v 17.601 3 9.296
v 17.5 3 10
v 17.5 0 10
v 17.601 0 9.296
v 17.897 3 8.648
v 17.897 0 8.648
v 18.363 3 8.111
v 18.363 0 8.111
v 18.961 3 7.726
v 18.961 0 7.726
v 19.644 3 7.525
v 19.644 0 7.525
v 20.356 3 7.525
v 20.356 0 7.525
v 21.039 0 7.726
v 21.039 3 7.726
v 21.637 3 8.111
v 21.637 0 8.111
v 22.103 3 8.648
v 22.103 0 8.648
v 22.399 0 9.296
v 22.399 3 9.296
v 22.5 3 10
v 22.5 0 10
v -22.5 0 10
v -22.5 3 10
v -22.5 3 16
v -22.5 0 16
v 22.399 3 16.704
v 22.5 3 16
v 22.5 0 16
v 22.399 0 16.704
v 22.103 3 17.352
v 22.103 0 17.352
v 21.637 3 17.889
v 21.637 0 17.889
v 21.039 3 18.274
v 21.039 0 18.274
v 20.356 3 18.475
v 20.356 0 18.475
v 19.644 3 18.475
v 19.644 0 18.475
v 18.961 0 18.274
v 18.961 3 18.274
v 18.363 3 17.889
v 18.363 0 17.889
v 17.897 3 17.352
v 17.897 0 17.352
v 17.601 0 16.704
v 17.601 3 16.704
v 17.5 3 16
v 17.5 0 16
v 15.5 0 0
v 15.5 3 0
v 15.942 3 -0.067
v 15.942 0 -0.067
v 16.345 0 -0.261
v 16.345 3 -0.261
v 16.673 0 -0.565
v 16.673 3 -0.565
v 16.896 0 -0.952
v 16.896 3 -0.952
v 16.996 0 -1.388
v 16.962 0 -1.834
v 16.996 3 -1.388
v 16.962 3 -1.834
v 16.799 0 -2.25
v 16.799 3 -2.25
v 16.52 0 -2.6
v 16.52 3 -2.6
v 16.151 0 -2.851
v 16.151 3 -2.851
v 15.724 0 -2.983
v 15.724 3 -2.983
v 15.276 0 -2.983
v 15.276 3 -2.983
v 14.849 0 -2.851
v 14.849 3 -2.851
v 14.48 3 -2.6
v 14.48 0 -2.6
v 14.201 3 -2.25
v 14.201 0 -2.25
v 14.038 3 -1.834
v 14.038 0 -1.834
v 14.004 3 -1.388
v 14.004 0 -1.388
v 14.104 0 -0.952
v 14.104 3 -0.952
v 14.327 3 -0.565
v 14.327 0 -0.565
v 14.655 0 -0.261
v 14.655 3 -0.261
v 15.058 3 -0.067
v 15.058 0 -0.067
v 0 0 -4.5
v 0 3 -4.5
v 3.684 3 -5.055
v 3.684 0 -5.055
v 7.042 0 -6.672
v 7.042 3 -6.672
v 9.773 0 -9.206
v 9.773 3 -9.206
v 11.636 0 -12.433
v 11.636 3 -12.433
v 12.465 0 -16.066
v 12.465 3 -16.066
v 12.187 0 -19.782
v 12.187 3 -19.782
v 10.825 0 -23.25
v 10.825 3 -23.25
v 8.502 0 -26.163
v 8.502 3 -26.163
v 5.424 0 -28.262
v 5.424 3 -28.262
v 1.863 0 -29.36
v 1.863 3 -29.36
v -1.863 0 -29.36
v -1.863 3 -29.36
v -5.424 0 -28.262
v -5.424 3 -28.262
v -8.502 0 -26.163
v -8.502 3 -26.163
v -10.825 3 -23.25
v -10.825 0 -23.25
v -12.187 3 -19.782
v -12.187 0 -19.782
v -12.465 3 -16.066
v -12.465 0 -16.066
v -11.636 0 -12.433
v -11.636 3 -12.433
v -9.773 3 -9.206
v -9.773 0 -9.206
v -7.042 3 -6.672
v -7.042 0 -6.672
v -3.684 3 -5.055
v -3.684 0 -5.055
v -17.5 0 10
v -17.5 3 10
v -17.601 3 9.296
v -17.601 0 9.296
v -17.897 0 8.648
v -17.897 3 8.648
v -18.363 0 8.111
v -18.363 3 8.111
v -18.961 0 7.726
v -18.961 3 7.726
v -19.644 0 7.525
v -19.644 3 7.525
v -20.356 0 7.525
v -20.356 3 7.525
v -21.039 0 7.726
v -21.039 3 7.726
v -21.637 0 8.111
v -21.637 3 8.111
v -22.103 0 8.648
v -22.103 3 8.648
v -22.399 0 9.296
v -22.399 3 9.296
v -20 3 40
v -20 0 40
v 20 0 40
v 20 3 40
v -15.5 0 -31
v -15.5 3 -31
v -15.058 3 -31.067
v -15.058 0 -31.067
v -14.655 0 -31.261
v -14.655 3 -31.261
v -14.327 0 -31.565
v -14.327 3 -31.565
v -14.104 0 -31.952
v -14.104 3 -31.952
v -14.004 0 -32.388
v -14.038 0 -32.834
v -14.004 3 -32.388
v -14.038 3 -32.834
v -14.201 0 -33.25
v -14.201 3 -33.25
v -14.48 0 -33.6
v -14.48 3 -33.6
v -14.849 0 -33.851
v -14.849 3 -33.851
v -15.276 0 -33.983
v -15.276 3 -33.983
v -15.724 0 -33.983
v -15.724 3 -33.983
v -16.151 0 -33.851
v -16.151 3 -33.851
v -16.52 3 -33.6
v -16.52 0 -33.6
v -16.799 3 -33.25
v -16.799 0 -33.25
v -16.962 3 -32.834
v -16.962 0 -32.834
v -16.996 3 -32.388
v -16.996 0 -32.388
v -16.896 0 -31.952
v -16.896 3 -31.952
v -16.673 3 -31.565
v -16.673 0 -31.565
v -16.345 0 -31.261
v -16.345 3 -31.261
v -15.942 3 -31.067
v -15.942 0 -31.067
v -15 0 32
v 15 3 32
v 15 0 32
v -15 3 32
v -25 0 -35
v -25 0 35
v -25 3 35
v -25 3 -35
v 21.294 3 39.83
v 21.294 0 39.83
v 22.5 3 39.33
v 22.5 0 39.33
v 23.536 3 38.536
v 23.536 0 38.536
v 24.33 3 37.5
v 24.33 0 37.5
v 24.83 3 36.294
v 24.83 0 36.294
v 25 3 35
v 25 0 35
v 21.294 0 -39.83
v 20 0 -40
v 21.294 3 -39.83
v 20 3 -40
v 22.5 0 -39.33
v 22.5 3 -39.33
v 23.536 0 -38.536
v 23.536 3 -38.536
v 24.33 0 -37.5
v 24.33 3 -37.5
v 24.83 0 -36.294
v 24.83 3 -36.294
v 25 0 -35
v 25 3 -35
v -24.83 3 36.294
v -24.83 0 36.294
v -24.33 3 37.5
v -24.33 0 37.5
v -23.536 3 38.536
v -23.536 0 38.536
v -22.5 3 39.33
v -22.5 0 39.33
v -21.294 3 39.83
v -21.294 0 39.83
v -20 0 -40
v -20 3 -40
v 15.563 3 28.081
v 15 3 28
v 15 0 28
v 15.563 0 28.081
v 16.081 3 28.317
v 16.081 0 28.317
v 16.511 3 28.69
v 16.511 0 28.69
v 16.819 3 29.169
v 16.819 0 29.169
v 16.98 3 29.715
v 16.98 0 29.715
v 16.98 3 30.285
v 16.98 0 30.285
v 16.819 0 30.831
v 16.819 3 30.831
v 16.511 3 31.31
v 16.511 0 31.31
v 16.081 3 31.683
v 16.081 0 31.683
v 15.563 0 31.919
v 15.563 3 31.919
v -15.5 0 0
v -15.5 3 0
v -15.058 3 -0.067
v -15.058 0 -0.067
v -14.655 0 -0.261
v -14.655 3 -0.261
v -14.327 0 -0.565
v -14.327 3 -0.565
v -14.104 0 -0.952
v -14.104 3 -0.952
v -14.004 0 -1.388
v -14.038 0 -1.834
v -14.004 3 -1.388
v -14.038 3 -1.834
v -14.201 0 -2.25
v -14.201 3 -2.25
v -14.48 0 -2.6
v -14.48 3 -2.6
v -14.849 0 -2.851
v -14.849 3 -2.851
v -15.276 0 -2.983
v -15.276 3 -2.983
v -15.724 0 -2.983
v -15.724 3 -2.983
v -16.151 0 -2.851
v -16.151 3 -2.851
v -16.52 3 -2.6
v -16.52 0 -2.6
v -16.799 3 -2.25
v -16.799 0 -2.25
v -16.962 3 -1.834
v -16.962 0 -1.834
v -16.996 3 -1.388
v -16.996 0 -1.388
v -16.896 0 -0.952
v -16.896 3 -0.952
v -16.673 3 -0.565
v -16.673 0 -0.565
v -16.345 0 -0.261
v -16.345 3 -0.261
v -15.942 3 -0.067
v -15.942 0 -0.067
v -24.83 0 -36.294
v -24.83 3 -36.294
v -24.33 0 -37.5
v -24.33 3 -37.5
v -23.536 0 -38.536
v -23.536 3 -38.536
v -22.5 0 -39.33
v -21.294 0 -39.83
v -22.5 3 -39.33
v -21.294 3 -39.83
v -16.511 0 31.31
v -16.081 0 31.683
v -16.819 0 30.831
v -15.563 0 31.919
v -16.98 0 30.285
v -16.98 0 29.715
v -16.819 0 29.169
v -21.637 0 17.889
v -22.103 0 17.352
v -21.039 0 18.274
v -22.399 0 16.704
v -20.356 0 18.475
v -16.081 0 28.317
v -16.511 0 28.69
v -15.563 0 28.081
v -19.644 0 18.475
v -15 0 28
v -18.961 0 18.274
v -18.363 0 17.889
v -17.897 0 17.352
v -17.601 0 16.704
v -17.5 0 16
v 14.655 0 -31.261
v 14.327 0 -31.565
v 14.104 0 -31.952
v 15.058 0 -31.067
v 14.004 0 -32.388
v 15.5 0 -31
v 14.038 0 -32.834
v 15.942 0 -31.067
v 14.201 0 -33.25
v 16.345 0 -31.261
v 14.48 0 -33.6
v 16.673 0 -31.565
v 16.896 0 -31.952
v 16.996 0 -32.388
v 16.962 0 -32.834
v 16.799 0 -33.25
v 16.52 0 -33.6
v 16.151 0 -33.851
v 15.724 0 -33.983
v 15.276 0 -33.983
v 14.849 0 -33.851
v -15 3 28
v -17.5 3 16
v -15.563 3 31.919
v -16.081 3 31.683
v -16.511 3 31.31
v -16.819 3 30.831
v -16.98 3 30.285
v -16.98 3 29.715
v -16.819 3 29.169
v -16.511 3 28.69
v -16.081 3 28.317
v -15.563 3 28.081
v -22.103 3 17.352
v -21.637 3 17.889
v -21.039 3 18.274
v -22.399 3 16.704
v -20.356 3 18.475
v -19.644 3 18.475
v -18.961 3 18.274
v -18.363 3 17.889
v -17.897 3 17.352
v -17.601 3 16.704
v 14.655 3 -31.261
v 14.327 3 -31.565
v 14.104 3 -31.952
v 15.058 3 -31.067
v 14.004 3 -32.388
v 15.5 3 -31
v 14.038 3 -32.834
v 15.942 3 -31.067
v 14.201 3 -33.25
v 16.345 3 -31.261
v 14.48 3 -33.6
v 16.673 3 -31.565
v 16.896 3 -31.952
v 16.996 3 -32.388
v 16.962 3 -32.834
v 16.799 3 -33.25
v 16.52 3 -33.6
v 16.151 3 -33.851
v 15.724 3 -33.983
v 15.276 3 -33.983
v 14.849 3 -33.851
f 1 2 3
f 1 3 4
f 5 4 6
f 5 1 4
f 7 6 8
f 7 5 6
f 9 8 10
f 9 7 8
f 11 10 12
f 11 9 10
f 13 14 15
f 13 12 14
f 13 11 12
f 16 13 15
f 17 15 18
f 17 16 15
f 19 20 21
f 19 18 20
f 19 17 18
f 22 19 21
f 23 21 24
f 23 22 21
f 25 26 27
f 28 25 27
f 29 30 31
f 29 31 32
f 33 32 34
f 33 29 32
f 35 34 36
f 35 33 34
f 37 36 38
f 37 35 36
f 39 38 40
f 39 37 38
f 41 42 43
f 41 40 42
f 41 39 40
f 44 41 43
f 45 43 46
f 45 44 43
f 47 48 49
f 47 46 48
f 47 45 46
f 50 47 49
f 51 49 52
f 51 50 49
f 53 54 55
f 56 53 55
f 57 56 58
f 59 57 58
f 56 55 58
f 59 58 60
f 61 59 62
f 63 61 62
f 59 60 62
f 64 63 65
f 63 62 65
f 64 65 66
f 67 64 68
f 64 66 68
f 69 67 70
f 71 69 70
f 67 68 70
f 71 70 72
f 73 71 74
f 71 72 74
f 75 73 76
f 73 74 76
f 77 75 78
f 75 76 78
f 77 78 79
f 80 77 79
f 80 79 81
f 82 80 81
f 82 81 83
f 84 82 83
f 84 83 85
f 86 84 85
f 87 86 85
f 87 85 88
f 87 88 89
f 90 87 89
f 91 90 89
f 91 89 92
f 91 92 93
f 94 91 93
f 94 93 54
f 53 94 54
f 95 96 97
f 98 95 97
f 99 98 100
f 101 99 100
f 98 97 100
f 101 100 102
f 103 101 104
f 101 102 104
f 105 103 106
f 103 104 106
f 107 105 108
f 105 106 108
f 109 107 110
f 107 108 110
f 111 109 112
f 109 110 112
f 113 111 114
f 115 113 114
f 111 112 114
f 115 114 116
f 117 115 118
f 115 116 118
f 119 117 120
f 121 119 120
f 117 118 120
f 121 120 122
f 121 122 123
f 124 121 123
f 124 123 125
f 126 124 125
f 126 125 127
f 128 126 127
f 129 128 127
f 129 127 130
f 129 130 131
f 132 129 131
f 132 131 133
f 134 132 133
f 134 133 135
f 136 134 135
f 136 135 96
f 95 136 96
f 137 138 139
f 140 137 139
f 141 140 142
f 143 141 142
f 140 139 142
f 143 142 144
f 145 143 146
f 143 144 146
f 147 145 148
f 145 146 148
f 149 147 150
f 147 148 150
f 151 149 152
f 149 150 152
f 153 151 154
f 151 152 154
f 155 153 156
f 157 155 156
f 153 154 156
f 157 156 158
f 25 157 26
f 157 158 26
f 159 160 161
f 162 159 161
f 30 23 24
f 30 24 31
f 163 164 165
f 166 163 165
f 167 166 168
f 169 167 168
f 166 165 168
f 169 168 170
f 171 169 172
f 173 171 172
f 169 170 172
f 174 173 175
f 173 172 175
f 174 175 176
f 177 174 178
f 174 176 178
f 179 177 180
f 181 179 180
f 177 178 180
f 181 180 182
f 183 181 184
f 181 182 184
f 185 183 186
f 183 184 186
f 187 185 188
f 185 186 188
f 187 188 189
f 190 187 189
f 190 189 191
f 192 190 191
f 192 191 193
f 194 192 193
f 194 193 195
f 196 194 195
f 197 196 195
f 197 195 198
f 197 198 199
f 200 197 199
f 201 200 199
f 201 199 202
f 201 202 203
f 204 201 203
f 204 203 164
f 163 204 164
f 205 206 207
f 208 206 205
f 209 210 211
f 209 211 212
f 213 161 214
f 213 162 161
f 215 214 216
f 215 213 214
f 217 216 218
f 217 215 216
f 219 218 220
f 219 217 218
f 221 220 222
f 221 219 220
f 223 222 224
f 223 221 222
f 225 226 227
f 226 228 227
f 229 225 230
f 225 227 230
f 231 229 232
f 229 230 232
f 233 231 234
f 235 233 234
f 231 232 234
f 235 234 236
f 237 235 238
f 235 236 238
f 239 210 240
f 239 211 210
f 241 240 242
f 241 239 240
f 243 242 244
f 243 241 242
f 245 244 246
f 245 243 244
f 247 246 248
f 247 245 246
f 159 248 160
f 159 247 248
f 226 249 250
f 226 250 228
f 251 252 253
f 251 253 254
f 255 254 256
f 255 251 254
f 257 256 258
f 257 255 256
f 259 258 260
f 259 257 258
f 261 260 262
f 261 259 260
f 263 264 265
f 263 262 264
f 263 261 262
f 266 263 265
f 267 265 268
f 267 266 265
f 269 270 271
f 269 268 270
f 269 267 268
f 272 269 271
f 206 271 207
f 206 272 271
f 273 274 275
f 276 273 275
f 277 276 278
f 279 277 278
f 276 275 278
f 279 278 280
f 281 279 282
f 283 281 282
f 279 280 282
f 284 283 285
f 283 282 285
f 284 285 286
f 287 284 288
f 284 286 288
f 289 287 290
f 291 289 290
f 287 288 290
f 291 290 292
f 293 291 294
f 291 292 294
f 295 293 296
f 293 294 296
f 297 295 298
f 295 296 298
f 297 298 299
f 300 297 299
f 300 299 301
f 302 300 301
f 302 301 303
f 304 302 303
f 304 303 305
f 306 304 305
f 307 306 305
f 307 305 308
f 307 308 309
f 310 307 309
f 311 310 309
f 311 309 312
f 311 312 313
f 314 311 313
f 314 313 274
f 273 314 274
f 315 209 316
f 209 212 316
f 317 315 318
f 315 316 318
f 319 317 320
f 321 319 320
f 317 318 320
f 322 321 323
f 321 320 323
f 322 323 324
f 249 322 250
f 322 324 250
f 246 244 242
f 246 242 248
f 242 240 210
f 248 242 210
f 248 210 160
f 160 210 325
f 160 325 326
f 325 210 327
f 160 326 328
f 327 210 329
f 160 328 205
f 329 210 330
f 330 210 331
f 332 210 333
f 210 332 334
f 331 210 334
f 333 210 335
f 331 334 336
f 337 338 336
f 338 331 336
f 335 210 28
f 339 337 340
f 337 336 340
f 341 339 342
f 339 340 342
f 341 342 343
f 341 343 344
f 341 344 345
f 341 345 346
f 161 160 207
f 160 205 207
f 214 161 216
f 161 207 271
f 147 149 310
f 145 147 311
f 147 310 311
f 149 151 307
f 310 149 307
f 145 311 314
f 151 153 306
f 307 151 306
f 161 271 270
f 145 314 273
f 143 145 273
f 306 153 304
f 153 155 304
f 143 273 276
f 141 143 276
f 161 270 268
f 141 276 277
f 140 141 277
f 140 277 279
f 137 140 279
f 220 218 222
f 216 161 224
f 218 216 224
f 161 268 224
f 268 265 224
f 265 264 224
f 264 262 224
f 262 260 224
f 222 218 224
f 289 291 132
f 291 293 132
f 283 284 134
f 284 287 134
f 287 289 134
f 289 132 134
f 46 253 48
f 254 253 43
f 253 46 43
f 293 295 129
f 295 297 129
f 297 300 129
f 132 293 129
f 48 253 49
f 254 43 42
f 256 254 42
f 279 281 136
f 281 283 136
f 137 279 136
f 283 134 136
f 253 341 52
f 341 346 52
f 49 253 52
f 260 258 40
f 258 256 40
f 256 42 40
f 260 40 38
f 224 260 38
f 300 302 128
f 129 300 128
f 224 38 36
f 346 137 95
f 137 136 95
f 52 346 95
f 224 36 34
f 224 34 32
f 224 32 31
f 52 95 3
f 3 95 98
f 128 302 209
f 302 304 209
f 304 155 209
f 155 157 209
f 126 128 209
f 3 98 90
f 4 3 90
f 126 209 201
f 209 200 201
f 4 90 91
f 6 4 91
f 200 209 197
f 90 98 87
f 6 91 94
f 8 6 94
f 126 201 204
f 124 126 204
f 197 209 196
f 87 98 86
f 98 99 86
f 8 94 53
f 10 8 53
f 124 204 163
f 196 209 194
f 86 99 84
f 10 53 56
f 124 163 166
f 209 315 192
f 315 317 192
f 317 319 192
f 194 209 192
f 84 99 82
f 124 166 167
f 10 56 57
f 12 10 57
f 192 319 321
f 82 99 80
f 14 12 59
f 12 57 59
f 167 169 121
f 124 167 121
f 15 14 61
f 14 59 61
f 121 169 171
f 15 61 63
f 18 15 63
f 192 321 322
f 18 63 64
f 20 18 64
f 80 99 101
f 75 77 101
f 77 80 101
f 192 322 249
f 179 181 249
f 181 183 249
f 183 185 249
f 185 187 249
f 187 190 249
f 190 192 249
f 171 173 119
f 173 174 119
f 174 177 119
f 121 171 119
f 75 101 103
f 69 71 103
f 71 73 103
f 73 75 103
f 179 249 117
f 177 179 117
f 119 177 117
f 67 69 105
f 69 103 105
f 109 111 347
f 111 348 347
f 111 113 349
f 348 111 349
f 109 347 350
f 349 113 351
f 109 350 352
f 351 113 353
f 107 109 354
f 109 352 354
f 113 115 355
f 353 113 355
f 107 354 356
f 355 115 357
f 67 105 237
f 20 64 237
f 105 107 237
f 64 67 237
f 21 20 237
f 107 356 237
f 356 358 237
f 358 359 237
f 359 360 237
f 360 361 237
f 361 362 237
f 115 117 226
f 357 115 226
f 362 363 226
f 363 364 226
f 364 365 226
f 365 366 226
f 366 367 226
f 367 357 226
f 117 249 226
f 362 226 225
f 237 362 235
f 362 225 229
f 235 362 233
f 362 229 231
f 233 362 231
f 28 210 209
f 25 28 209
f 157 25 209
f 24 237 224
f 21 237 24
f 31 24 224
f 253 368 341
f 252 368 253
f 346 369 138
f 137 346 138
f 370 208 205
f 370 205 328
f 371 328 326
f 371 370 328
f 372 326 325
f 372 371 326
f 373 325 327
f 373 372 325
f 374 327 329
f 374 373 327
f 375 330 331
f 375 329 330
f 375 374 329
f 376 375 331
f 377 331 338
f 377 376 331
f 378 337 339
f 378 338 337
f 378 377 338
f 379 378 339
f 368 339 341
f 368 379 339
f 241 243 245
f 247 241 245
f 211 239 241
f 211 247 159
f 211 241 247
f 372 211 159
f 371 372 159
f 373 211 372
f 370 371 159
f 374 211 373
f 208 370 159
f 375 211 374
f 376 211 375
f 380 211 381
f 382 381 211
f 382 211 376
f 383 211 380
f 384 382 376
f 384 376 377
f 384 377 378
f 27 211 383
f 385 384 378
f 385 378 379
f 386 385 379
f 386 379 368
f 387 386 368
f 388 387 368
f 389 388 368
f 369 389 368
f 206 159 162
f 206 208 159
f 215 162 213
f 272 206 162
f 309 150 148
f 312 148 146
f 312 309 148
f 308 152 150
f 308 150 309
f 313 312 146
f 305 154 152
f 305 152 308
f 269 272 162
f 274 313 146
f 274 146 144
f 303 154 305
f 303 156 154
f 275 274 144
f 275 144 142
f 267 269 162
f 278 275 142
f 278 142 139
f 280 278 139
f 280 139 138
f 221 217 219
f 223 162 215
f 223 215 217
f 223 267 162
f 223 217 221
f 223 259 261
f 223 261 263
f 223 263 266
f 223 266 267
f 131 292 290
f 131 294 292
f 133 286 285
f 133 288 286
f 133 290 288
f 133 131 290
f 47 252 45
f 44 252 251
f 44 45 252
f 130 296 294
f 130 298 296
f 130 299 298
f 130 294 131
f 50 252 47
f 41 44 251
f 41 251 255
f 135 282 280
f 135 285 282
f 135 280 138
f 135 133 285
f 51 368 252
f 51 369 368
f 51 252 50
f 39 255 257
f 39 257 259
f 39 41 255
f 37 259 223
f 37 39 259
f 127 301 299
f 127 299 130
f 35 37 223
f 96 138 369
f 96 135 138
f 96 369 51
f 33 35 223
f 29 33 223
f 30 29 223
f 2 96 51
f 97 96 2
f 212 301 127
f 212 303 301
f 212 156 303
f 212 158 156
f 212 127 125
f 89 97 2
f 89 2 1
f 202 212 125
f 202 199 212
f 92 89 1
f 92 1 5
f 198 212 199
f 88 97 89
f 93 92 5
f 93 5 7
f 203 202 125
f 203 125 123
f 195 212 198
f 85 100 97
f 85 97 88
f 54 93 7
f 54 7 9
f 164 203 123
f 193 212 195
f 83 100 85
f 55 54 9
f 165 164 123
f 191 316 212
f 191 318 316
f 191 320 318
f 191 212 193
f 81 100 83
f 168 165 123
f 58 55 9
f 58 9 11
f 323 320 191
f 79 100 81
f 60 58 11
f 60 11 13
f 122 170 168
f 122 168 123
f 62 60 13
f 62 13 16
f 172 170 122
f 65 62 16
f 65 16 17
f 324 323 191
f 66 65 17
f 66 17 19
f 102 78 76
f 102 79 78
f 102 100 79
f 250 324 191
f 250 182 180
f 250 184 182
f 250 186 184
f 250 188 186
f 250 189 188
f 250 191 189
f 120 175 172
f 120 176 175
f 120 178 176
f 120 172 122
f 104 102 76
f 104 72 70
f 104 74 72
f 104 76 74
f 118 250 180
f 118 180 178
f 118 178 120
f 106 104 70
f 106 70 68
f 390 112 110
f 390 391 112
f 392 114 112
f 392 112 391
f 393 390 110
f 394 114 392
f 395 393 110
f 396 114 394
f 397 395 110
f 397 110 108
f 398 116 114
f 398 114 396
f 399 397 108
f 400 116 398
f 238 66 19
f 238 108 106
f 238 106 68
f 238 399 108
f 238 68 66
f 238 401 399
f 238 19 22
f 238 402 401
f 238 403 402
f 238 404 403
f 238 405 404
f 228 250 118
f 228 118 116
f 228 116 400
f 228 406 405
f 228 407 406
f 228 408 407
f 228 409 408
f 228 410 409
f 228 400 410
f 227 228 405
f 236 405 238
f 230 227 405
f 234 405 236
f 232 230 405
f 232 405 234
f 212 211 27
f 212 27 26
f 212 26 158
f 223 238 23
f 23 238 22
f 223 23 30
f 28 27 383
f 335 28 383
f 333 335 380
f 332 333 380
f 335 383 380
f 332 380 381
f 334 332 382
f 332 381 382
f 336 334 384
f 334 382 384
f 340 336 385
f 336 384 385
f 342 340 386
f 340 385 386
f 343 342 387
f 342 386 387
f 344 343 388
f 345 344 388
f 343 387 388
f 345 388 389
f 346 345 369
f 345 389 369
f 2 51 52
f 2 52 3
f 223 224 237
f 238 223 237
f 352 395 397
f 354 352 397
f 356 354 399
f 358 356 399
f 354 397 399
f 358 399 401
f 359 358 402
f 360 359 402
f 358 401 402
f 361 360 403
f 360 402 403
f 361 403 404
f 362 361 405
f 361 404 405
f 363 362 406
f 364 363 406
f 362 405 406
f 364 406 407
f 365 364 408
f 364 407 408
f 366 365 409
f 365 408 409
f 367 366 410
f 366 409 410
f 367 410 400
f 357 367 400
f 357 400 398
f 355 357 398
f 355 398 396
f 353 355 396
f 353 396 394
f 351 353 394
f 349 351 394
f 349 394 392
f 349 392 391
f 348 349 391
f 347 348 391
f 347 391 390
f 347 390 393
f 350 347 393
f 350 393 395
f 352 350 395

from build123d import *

# Parameters (mm, degrees)
SKETCH1_W           = 50
SKETCH1_H           = 80
BOSS_EXTRUDE1_DEPTH = 3
SKETCH2_R           = 1.5
SKETCH2_R_2         = 12.5
CUT_EXTRUDE1_DEPTH  = 48.265209192
FILLET1_R           = 5
CUT_EXTRUDE2_DEPTH  = 48.265209192


with BuildPart() as part:
    # Sketch1 → Boss-Extrude1 (new body)
    with BuildSketch(Plane(origin=(0, 0, 0), x_dir=(1, 0, 0), z_dir=(0, 1, 0))):
        Rectangle(SKETCH1_W, SKETCH1_H)
    extrude(amount=BOSS_EXTRUDE1_DEPTH)

    # Sketch2 → Cut-Extrude1 (cut, through all)
    with BuildSketch(Plane(origin=(0, 3, 0), x_dir=(1, 0, 0), z_dir=(0, 1, 0))):
        with Locations(Location((15.5, 32.5, 0), (0, 0, 270))):
            Circle(SKETCH2_R)
        with Locations(Location((-15.5, 32.5, 0), (0, 0, 270))):
            Circle(SKETCH2_R)
        with Locations(Location((-15.5, 1.5, 0), (0, 0, 270))):
            Circle(SKETCH2_R)
        with Locations(Location((15.5, 1.5, 0), (0, 0, 270))):
            Circle(SKETCH2_R)
        with Locations(Location((0, 17, 0), (0, 0, 270))):
            Circle(SKETCH2_R_2)
        with BuildLine():
            Line((-15, -28), (15, -28))
            ThreePointArc((15, -28), (17, -30), (15, -32))
            Line((15, -32), (-15, -32))
            ThreePointArc((-15, -32), (-17, -30), (-15, -28))
        make_face()
    extrude(amount=-CUT_EXTRUDE1_DEPTH, mode=Mode.SUBTRACT)

    # Fillet1
    fillet1_edges = [part.edges().sort_by_distance(p)[0] for p in [
        (-25, 1.5, -40),
        (25, 1.5, -40),
        (25, 1.5, 40),
        (-25, 1.5, 40),
    ]]
    fillet(fillet1_edges, radius=FILLET1_R)

    # Sketch3 → Cut-Extrude2 (cut, through all)
    with BuildSketch(Plane(origin=(0, 3, 0), x_dir=(1, 0, 0), z_dir=(0, 1, 0))):
        with BuildLine():
            Line((22.5, -10), (22.5, -16))
            ThreePointArc((22.5, -16), (20, -18.5), (17.5, -16))
            Line((17.5, -16), (17.5, -10))
            ThreePointArc((17.5, -10), (20, -7.5), (22.5, -10))
        make_face()
        with BuildLine():
            Line((-22.5, -10), (-22.5, -16))
            ThreePointArc((-22.5, -16), (-20, -18.5), (-17.5, -16))
            Line((-17.5, -16), (-17.5, -10))
            ThreePointArc((-17.5, -10), (-20, -7.5), (-22.5, -10))
        make_face()
    extrude(amount=-CUT_EXTRUDE2_DEPTH, mode=Mode.SUBTRACT)


solid = part.part
